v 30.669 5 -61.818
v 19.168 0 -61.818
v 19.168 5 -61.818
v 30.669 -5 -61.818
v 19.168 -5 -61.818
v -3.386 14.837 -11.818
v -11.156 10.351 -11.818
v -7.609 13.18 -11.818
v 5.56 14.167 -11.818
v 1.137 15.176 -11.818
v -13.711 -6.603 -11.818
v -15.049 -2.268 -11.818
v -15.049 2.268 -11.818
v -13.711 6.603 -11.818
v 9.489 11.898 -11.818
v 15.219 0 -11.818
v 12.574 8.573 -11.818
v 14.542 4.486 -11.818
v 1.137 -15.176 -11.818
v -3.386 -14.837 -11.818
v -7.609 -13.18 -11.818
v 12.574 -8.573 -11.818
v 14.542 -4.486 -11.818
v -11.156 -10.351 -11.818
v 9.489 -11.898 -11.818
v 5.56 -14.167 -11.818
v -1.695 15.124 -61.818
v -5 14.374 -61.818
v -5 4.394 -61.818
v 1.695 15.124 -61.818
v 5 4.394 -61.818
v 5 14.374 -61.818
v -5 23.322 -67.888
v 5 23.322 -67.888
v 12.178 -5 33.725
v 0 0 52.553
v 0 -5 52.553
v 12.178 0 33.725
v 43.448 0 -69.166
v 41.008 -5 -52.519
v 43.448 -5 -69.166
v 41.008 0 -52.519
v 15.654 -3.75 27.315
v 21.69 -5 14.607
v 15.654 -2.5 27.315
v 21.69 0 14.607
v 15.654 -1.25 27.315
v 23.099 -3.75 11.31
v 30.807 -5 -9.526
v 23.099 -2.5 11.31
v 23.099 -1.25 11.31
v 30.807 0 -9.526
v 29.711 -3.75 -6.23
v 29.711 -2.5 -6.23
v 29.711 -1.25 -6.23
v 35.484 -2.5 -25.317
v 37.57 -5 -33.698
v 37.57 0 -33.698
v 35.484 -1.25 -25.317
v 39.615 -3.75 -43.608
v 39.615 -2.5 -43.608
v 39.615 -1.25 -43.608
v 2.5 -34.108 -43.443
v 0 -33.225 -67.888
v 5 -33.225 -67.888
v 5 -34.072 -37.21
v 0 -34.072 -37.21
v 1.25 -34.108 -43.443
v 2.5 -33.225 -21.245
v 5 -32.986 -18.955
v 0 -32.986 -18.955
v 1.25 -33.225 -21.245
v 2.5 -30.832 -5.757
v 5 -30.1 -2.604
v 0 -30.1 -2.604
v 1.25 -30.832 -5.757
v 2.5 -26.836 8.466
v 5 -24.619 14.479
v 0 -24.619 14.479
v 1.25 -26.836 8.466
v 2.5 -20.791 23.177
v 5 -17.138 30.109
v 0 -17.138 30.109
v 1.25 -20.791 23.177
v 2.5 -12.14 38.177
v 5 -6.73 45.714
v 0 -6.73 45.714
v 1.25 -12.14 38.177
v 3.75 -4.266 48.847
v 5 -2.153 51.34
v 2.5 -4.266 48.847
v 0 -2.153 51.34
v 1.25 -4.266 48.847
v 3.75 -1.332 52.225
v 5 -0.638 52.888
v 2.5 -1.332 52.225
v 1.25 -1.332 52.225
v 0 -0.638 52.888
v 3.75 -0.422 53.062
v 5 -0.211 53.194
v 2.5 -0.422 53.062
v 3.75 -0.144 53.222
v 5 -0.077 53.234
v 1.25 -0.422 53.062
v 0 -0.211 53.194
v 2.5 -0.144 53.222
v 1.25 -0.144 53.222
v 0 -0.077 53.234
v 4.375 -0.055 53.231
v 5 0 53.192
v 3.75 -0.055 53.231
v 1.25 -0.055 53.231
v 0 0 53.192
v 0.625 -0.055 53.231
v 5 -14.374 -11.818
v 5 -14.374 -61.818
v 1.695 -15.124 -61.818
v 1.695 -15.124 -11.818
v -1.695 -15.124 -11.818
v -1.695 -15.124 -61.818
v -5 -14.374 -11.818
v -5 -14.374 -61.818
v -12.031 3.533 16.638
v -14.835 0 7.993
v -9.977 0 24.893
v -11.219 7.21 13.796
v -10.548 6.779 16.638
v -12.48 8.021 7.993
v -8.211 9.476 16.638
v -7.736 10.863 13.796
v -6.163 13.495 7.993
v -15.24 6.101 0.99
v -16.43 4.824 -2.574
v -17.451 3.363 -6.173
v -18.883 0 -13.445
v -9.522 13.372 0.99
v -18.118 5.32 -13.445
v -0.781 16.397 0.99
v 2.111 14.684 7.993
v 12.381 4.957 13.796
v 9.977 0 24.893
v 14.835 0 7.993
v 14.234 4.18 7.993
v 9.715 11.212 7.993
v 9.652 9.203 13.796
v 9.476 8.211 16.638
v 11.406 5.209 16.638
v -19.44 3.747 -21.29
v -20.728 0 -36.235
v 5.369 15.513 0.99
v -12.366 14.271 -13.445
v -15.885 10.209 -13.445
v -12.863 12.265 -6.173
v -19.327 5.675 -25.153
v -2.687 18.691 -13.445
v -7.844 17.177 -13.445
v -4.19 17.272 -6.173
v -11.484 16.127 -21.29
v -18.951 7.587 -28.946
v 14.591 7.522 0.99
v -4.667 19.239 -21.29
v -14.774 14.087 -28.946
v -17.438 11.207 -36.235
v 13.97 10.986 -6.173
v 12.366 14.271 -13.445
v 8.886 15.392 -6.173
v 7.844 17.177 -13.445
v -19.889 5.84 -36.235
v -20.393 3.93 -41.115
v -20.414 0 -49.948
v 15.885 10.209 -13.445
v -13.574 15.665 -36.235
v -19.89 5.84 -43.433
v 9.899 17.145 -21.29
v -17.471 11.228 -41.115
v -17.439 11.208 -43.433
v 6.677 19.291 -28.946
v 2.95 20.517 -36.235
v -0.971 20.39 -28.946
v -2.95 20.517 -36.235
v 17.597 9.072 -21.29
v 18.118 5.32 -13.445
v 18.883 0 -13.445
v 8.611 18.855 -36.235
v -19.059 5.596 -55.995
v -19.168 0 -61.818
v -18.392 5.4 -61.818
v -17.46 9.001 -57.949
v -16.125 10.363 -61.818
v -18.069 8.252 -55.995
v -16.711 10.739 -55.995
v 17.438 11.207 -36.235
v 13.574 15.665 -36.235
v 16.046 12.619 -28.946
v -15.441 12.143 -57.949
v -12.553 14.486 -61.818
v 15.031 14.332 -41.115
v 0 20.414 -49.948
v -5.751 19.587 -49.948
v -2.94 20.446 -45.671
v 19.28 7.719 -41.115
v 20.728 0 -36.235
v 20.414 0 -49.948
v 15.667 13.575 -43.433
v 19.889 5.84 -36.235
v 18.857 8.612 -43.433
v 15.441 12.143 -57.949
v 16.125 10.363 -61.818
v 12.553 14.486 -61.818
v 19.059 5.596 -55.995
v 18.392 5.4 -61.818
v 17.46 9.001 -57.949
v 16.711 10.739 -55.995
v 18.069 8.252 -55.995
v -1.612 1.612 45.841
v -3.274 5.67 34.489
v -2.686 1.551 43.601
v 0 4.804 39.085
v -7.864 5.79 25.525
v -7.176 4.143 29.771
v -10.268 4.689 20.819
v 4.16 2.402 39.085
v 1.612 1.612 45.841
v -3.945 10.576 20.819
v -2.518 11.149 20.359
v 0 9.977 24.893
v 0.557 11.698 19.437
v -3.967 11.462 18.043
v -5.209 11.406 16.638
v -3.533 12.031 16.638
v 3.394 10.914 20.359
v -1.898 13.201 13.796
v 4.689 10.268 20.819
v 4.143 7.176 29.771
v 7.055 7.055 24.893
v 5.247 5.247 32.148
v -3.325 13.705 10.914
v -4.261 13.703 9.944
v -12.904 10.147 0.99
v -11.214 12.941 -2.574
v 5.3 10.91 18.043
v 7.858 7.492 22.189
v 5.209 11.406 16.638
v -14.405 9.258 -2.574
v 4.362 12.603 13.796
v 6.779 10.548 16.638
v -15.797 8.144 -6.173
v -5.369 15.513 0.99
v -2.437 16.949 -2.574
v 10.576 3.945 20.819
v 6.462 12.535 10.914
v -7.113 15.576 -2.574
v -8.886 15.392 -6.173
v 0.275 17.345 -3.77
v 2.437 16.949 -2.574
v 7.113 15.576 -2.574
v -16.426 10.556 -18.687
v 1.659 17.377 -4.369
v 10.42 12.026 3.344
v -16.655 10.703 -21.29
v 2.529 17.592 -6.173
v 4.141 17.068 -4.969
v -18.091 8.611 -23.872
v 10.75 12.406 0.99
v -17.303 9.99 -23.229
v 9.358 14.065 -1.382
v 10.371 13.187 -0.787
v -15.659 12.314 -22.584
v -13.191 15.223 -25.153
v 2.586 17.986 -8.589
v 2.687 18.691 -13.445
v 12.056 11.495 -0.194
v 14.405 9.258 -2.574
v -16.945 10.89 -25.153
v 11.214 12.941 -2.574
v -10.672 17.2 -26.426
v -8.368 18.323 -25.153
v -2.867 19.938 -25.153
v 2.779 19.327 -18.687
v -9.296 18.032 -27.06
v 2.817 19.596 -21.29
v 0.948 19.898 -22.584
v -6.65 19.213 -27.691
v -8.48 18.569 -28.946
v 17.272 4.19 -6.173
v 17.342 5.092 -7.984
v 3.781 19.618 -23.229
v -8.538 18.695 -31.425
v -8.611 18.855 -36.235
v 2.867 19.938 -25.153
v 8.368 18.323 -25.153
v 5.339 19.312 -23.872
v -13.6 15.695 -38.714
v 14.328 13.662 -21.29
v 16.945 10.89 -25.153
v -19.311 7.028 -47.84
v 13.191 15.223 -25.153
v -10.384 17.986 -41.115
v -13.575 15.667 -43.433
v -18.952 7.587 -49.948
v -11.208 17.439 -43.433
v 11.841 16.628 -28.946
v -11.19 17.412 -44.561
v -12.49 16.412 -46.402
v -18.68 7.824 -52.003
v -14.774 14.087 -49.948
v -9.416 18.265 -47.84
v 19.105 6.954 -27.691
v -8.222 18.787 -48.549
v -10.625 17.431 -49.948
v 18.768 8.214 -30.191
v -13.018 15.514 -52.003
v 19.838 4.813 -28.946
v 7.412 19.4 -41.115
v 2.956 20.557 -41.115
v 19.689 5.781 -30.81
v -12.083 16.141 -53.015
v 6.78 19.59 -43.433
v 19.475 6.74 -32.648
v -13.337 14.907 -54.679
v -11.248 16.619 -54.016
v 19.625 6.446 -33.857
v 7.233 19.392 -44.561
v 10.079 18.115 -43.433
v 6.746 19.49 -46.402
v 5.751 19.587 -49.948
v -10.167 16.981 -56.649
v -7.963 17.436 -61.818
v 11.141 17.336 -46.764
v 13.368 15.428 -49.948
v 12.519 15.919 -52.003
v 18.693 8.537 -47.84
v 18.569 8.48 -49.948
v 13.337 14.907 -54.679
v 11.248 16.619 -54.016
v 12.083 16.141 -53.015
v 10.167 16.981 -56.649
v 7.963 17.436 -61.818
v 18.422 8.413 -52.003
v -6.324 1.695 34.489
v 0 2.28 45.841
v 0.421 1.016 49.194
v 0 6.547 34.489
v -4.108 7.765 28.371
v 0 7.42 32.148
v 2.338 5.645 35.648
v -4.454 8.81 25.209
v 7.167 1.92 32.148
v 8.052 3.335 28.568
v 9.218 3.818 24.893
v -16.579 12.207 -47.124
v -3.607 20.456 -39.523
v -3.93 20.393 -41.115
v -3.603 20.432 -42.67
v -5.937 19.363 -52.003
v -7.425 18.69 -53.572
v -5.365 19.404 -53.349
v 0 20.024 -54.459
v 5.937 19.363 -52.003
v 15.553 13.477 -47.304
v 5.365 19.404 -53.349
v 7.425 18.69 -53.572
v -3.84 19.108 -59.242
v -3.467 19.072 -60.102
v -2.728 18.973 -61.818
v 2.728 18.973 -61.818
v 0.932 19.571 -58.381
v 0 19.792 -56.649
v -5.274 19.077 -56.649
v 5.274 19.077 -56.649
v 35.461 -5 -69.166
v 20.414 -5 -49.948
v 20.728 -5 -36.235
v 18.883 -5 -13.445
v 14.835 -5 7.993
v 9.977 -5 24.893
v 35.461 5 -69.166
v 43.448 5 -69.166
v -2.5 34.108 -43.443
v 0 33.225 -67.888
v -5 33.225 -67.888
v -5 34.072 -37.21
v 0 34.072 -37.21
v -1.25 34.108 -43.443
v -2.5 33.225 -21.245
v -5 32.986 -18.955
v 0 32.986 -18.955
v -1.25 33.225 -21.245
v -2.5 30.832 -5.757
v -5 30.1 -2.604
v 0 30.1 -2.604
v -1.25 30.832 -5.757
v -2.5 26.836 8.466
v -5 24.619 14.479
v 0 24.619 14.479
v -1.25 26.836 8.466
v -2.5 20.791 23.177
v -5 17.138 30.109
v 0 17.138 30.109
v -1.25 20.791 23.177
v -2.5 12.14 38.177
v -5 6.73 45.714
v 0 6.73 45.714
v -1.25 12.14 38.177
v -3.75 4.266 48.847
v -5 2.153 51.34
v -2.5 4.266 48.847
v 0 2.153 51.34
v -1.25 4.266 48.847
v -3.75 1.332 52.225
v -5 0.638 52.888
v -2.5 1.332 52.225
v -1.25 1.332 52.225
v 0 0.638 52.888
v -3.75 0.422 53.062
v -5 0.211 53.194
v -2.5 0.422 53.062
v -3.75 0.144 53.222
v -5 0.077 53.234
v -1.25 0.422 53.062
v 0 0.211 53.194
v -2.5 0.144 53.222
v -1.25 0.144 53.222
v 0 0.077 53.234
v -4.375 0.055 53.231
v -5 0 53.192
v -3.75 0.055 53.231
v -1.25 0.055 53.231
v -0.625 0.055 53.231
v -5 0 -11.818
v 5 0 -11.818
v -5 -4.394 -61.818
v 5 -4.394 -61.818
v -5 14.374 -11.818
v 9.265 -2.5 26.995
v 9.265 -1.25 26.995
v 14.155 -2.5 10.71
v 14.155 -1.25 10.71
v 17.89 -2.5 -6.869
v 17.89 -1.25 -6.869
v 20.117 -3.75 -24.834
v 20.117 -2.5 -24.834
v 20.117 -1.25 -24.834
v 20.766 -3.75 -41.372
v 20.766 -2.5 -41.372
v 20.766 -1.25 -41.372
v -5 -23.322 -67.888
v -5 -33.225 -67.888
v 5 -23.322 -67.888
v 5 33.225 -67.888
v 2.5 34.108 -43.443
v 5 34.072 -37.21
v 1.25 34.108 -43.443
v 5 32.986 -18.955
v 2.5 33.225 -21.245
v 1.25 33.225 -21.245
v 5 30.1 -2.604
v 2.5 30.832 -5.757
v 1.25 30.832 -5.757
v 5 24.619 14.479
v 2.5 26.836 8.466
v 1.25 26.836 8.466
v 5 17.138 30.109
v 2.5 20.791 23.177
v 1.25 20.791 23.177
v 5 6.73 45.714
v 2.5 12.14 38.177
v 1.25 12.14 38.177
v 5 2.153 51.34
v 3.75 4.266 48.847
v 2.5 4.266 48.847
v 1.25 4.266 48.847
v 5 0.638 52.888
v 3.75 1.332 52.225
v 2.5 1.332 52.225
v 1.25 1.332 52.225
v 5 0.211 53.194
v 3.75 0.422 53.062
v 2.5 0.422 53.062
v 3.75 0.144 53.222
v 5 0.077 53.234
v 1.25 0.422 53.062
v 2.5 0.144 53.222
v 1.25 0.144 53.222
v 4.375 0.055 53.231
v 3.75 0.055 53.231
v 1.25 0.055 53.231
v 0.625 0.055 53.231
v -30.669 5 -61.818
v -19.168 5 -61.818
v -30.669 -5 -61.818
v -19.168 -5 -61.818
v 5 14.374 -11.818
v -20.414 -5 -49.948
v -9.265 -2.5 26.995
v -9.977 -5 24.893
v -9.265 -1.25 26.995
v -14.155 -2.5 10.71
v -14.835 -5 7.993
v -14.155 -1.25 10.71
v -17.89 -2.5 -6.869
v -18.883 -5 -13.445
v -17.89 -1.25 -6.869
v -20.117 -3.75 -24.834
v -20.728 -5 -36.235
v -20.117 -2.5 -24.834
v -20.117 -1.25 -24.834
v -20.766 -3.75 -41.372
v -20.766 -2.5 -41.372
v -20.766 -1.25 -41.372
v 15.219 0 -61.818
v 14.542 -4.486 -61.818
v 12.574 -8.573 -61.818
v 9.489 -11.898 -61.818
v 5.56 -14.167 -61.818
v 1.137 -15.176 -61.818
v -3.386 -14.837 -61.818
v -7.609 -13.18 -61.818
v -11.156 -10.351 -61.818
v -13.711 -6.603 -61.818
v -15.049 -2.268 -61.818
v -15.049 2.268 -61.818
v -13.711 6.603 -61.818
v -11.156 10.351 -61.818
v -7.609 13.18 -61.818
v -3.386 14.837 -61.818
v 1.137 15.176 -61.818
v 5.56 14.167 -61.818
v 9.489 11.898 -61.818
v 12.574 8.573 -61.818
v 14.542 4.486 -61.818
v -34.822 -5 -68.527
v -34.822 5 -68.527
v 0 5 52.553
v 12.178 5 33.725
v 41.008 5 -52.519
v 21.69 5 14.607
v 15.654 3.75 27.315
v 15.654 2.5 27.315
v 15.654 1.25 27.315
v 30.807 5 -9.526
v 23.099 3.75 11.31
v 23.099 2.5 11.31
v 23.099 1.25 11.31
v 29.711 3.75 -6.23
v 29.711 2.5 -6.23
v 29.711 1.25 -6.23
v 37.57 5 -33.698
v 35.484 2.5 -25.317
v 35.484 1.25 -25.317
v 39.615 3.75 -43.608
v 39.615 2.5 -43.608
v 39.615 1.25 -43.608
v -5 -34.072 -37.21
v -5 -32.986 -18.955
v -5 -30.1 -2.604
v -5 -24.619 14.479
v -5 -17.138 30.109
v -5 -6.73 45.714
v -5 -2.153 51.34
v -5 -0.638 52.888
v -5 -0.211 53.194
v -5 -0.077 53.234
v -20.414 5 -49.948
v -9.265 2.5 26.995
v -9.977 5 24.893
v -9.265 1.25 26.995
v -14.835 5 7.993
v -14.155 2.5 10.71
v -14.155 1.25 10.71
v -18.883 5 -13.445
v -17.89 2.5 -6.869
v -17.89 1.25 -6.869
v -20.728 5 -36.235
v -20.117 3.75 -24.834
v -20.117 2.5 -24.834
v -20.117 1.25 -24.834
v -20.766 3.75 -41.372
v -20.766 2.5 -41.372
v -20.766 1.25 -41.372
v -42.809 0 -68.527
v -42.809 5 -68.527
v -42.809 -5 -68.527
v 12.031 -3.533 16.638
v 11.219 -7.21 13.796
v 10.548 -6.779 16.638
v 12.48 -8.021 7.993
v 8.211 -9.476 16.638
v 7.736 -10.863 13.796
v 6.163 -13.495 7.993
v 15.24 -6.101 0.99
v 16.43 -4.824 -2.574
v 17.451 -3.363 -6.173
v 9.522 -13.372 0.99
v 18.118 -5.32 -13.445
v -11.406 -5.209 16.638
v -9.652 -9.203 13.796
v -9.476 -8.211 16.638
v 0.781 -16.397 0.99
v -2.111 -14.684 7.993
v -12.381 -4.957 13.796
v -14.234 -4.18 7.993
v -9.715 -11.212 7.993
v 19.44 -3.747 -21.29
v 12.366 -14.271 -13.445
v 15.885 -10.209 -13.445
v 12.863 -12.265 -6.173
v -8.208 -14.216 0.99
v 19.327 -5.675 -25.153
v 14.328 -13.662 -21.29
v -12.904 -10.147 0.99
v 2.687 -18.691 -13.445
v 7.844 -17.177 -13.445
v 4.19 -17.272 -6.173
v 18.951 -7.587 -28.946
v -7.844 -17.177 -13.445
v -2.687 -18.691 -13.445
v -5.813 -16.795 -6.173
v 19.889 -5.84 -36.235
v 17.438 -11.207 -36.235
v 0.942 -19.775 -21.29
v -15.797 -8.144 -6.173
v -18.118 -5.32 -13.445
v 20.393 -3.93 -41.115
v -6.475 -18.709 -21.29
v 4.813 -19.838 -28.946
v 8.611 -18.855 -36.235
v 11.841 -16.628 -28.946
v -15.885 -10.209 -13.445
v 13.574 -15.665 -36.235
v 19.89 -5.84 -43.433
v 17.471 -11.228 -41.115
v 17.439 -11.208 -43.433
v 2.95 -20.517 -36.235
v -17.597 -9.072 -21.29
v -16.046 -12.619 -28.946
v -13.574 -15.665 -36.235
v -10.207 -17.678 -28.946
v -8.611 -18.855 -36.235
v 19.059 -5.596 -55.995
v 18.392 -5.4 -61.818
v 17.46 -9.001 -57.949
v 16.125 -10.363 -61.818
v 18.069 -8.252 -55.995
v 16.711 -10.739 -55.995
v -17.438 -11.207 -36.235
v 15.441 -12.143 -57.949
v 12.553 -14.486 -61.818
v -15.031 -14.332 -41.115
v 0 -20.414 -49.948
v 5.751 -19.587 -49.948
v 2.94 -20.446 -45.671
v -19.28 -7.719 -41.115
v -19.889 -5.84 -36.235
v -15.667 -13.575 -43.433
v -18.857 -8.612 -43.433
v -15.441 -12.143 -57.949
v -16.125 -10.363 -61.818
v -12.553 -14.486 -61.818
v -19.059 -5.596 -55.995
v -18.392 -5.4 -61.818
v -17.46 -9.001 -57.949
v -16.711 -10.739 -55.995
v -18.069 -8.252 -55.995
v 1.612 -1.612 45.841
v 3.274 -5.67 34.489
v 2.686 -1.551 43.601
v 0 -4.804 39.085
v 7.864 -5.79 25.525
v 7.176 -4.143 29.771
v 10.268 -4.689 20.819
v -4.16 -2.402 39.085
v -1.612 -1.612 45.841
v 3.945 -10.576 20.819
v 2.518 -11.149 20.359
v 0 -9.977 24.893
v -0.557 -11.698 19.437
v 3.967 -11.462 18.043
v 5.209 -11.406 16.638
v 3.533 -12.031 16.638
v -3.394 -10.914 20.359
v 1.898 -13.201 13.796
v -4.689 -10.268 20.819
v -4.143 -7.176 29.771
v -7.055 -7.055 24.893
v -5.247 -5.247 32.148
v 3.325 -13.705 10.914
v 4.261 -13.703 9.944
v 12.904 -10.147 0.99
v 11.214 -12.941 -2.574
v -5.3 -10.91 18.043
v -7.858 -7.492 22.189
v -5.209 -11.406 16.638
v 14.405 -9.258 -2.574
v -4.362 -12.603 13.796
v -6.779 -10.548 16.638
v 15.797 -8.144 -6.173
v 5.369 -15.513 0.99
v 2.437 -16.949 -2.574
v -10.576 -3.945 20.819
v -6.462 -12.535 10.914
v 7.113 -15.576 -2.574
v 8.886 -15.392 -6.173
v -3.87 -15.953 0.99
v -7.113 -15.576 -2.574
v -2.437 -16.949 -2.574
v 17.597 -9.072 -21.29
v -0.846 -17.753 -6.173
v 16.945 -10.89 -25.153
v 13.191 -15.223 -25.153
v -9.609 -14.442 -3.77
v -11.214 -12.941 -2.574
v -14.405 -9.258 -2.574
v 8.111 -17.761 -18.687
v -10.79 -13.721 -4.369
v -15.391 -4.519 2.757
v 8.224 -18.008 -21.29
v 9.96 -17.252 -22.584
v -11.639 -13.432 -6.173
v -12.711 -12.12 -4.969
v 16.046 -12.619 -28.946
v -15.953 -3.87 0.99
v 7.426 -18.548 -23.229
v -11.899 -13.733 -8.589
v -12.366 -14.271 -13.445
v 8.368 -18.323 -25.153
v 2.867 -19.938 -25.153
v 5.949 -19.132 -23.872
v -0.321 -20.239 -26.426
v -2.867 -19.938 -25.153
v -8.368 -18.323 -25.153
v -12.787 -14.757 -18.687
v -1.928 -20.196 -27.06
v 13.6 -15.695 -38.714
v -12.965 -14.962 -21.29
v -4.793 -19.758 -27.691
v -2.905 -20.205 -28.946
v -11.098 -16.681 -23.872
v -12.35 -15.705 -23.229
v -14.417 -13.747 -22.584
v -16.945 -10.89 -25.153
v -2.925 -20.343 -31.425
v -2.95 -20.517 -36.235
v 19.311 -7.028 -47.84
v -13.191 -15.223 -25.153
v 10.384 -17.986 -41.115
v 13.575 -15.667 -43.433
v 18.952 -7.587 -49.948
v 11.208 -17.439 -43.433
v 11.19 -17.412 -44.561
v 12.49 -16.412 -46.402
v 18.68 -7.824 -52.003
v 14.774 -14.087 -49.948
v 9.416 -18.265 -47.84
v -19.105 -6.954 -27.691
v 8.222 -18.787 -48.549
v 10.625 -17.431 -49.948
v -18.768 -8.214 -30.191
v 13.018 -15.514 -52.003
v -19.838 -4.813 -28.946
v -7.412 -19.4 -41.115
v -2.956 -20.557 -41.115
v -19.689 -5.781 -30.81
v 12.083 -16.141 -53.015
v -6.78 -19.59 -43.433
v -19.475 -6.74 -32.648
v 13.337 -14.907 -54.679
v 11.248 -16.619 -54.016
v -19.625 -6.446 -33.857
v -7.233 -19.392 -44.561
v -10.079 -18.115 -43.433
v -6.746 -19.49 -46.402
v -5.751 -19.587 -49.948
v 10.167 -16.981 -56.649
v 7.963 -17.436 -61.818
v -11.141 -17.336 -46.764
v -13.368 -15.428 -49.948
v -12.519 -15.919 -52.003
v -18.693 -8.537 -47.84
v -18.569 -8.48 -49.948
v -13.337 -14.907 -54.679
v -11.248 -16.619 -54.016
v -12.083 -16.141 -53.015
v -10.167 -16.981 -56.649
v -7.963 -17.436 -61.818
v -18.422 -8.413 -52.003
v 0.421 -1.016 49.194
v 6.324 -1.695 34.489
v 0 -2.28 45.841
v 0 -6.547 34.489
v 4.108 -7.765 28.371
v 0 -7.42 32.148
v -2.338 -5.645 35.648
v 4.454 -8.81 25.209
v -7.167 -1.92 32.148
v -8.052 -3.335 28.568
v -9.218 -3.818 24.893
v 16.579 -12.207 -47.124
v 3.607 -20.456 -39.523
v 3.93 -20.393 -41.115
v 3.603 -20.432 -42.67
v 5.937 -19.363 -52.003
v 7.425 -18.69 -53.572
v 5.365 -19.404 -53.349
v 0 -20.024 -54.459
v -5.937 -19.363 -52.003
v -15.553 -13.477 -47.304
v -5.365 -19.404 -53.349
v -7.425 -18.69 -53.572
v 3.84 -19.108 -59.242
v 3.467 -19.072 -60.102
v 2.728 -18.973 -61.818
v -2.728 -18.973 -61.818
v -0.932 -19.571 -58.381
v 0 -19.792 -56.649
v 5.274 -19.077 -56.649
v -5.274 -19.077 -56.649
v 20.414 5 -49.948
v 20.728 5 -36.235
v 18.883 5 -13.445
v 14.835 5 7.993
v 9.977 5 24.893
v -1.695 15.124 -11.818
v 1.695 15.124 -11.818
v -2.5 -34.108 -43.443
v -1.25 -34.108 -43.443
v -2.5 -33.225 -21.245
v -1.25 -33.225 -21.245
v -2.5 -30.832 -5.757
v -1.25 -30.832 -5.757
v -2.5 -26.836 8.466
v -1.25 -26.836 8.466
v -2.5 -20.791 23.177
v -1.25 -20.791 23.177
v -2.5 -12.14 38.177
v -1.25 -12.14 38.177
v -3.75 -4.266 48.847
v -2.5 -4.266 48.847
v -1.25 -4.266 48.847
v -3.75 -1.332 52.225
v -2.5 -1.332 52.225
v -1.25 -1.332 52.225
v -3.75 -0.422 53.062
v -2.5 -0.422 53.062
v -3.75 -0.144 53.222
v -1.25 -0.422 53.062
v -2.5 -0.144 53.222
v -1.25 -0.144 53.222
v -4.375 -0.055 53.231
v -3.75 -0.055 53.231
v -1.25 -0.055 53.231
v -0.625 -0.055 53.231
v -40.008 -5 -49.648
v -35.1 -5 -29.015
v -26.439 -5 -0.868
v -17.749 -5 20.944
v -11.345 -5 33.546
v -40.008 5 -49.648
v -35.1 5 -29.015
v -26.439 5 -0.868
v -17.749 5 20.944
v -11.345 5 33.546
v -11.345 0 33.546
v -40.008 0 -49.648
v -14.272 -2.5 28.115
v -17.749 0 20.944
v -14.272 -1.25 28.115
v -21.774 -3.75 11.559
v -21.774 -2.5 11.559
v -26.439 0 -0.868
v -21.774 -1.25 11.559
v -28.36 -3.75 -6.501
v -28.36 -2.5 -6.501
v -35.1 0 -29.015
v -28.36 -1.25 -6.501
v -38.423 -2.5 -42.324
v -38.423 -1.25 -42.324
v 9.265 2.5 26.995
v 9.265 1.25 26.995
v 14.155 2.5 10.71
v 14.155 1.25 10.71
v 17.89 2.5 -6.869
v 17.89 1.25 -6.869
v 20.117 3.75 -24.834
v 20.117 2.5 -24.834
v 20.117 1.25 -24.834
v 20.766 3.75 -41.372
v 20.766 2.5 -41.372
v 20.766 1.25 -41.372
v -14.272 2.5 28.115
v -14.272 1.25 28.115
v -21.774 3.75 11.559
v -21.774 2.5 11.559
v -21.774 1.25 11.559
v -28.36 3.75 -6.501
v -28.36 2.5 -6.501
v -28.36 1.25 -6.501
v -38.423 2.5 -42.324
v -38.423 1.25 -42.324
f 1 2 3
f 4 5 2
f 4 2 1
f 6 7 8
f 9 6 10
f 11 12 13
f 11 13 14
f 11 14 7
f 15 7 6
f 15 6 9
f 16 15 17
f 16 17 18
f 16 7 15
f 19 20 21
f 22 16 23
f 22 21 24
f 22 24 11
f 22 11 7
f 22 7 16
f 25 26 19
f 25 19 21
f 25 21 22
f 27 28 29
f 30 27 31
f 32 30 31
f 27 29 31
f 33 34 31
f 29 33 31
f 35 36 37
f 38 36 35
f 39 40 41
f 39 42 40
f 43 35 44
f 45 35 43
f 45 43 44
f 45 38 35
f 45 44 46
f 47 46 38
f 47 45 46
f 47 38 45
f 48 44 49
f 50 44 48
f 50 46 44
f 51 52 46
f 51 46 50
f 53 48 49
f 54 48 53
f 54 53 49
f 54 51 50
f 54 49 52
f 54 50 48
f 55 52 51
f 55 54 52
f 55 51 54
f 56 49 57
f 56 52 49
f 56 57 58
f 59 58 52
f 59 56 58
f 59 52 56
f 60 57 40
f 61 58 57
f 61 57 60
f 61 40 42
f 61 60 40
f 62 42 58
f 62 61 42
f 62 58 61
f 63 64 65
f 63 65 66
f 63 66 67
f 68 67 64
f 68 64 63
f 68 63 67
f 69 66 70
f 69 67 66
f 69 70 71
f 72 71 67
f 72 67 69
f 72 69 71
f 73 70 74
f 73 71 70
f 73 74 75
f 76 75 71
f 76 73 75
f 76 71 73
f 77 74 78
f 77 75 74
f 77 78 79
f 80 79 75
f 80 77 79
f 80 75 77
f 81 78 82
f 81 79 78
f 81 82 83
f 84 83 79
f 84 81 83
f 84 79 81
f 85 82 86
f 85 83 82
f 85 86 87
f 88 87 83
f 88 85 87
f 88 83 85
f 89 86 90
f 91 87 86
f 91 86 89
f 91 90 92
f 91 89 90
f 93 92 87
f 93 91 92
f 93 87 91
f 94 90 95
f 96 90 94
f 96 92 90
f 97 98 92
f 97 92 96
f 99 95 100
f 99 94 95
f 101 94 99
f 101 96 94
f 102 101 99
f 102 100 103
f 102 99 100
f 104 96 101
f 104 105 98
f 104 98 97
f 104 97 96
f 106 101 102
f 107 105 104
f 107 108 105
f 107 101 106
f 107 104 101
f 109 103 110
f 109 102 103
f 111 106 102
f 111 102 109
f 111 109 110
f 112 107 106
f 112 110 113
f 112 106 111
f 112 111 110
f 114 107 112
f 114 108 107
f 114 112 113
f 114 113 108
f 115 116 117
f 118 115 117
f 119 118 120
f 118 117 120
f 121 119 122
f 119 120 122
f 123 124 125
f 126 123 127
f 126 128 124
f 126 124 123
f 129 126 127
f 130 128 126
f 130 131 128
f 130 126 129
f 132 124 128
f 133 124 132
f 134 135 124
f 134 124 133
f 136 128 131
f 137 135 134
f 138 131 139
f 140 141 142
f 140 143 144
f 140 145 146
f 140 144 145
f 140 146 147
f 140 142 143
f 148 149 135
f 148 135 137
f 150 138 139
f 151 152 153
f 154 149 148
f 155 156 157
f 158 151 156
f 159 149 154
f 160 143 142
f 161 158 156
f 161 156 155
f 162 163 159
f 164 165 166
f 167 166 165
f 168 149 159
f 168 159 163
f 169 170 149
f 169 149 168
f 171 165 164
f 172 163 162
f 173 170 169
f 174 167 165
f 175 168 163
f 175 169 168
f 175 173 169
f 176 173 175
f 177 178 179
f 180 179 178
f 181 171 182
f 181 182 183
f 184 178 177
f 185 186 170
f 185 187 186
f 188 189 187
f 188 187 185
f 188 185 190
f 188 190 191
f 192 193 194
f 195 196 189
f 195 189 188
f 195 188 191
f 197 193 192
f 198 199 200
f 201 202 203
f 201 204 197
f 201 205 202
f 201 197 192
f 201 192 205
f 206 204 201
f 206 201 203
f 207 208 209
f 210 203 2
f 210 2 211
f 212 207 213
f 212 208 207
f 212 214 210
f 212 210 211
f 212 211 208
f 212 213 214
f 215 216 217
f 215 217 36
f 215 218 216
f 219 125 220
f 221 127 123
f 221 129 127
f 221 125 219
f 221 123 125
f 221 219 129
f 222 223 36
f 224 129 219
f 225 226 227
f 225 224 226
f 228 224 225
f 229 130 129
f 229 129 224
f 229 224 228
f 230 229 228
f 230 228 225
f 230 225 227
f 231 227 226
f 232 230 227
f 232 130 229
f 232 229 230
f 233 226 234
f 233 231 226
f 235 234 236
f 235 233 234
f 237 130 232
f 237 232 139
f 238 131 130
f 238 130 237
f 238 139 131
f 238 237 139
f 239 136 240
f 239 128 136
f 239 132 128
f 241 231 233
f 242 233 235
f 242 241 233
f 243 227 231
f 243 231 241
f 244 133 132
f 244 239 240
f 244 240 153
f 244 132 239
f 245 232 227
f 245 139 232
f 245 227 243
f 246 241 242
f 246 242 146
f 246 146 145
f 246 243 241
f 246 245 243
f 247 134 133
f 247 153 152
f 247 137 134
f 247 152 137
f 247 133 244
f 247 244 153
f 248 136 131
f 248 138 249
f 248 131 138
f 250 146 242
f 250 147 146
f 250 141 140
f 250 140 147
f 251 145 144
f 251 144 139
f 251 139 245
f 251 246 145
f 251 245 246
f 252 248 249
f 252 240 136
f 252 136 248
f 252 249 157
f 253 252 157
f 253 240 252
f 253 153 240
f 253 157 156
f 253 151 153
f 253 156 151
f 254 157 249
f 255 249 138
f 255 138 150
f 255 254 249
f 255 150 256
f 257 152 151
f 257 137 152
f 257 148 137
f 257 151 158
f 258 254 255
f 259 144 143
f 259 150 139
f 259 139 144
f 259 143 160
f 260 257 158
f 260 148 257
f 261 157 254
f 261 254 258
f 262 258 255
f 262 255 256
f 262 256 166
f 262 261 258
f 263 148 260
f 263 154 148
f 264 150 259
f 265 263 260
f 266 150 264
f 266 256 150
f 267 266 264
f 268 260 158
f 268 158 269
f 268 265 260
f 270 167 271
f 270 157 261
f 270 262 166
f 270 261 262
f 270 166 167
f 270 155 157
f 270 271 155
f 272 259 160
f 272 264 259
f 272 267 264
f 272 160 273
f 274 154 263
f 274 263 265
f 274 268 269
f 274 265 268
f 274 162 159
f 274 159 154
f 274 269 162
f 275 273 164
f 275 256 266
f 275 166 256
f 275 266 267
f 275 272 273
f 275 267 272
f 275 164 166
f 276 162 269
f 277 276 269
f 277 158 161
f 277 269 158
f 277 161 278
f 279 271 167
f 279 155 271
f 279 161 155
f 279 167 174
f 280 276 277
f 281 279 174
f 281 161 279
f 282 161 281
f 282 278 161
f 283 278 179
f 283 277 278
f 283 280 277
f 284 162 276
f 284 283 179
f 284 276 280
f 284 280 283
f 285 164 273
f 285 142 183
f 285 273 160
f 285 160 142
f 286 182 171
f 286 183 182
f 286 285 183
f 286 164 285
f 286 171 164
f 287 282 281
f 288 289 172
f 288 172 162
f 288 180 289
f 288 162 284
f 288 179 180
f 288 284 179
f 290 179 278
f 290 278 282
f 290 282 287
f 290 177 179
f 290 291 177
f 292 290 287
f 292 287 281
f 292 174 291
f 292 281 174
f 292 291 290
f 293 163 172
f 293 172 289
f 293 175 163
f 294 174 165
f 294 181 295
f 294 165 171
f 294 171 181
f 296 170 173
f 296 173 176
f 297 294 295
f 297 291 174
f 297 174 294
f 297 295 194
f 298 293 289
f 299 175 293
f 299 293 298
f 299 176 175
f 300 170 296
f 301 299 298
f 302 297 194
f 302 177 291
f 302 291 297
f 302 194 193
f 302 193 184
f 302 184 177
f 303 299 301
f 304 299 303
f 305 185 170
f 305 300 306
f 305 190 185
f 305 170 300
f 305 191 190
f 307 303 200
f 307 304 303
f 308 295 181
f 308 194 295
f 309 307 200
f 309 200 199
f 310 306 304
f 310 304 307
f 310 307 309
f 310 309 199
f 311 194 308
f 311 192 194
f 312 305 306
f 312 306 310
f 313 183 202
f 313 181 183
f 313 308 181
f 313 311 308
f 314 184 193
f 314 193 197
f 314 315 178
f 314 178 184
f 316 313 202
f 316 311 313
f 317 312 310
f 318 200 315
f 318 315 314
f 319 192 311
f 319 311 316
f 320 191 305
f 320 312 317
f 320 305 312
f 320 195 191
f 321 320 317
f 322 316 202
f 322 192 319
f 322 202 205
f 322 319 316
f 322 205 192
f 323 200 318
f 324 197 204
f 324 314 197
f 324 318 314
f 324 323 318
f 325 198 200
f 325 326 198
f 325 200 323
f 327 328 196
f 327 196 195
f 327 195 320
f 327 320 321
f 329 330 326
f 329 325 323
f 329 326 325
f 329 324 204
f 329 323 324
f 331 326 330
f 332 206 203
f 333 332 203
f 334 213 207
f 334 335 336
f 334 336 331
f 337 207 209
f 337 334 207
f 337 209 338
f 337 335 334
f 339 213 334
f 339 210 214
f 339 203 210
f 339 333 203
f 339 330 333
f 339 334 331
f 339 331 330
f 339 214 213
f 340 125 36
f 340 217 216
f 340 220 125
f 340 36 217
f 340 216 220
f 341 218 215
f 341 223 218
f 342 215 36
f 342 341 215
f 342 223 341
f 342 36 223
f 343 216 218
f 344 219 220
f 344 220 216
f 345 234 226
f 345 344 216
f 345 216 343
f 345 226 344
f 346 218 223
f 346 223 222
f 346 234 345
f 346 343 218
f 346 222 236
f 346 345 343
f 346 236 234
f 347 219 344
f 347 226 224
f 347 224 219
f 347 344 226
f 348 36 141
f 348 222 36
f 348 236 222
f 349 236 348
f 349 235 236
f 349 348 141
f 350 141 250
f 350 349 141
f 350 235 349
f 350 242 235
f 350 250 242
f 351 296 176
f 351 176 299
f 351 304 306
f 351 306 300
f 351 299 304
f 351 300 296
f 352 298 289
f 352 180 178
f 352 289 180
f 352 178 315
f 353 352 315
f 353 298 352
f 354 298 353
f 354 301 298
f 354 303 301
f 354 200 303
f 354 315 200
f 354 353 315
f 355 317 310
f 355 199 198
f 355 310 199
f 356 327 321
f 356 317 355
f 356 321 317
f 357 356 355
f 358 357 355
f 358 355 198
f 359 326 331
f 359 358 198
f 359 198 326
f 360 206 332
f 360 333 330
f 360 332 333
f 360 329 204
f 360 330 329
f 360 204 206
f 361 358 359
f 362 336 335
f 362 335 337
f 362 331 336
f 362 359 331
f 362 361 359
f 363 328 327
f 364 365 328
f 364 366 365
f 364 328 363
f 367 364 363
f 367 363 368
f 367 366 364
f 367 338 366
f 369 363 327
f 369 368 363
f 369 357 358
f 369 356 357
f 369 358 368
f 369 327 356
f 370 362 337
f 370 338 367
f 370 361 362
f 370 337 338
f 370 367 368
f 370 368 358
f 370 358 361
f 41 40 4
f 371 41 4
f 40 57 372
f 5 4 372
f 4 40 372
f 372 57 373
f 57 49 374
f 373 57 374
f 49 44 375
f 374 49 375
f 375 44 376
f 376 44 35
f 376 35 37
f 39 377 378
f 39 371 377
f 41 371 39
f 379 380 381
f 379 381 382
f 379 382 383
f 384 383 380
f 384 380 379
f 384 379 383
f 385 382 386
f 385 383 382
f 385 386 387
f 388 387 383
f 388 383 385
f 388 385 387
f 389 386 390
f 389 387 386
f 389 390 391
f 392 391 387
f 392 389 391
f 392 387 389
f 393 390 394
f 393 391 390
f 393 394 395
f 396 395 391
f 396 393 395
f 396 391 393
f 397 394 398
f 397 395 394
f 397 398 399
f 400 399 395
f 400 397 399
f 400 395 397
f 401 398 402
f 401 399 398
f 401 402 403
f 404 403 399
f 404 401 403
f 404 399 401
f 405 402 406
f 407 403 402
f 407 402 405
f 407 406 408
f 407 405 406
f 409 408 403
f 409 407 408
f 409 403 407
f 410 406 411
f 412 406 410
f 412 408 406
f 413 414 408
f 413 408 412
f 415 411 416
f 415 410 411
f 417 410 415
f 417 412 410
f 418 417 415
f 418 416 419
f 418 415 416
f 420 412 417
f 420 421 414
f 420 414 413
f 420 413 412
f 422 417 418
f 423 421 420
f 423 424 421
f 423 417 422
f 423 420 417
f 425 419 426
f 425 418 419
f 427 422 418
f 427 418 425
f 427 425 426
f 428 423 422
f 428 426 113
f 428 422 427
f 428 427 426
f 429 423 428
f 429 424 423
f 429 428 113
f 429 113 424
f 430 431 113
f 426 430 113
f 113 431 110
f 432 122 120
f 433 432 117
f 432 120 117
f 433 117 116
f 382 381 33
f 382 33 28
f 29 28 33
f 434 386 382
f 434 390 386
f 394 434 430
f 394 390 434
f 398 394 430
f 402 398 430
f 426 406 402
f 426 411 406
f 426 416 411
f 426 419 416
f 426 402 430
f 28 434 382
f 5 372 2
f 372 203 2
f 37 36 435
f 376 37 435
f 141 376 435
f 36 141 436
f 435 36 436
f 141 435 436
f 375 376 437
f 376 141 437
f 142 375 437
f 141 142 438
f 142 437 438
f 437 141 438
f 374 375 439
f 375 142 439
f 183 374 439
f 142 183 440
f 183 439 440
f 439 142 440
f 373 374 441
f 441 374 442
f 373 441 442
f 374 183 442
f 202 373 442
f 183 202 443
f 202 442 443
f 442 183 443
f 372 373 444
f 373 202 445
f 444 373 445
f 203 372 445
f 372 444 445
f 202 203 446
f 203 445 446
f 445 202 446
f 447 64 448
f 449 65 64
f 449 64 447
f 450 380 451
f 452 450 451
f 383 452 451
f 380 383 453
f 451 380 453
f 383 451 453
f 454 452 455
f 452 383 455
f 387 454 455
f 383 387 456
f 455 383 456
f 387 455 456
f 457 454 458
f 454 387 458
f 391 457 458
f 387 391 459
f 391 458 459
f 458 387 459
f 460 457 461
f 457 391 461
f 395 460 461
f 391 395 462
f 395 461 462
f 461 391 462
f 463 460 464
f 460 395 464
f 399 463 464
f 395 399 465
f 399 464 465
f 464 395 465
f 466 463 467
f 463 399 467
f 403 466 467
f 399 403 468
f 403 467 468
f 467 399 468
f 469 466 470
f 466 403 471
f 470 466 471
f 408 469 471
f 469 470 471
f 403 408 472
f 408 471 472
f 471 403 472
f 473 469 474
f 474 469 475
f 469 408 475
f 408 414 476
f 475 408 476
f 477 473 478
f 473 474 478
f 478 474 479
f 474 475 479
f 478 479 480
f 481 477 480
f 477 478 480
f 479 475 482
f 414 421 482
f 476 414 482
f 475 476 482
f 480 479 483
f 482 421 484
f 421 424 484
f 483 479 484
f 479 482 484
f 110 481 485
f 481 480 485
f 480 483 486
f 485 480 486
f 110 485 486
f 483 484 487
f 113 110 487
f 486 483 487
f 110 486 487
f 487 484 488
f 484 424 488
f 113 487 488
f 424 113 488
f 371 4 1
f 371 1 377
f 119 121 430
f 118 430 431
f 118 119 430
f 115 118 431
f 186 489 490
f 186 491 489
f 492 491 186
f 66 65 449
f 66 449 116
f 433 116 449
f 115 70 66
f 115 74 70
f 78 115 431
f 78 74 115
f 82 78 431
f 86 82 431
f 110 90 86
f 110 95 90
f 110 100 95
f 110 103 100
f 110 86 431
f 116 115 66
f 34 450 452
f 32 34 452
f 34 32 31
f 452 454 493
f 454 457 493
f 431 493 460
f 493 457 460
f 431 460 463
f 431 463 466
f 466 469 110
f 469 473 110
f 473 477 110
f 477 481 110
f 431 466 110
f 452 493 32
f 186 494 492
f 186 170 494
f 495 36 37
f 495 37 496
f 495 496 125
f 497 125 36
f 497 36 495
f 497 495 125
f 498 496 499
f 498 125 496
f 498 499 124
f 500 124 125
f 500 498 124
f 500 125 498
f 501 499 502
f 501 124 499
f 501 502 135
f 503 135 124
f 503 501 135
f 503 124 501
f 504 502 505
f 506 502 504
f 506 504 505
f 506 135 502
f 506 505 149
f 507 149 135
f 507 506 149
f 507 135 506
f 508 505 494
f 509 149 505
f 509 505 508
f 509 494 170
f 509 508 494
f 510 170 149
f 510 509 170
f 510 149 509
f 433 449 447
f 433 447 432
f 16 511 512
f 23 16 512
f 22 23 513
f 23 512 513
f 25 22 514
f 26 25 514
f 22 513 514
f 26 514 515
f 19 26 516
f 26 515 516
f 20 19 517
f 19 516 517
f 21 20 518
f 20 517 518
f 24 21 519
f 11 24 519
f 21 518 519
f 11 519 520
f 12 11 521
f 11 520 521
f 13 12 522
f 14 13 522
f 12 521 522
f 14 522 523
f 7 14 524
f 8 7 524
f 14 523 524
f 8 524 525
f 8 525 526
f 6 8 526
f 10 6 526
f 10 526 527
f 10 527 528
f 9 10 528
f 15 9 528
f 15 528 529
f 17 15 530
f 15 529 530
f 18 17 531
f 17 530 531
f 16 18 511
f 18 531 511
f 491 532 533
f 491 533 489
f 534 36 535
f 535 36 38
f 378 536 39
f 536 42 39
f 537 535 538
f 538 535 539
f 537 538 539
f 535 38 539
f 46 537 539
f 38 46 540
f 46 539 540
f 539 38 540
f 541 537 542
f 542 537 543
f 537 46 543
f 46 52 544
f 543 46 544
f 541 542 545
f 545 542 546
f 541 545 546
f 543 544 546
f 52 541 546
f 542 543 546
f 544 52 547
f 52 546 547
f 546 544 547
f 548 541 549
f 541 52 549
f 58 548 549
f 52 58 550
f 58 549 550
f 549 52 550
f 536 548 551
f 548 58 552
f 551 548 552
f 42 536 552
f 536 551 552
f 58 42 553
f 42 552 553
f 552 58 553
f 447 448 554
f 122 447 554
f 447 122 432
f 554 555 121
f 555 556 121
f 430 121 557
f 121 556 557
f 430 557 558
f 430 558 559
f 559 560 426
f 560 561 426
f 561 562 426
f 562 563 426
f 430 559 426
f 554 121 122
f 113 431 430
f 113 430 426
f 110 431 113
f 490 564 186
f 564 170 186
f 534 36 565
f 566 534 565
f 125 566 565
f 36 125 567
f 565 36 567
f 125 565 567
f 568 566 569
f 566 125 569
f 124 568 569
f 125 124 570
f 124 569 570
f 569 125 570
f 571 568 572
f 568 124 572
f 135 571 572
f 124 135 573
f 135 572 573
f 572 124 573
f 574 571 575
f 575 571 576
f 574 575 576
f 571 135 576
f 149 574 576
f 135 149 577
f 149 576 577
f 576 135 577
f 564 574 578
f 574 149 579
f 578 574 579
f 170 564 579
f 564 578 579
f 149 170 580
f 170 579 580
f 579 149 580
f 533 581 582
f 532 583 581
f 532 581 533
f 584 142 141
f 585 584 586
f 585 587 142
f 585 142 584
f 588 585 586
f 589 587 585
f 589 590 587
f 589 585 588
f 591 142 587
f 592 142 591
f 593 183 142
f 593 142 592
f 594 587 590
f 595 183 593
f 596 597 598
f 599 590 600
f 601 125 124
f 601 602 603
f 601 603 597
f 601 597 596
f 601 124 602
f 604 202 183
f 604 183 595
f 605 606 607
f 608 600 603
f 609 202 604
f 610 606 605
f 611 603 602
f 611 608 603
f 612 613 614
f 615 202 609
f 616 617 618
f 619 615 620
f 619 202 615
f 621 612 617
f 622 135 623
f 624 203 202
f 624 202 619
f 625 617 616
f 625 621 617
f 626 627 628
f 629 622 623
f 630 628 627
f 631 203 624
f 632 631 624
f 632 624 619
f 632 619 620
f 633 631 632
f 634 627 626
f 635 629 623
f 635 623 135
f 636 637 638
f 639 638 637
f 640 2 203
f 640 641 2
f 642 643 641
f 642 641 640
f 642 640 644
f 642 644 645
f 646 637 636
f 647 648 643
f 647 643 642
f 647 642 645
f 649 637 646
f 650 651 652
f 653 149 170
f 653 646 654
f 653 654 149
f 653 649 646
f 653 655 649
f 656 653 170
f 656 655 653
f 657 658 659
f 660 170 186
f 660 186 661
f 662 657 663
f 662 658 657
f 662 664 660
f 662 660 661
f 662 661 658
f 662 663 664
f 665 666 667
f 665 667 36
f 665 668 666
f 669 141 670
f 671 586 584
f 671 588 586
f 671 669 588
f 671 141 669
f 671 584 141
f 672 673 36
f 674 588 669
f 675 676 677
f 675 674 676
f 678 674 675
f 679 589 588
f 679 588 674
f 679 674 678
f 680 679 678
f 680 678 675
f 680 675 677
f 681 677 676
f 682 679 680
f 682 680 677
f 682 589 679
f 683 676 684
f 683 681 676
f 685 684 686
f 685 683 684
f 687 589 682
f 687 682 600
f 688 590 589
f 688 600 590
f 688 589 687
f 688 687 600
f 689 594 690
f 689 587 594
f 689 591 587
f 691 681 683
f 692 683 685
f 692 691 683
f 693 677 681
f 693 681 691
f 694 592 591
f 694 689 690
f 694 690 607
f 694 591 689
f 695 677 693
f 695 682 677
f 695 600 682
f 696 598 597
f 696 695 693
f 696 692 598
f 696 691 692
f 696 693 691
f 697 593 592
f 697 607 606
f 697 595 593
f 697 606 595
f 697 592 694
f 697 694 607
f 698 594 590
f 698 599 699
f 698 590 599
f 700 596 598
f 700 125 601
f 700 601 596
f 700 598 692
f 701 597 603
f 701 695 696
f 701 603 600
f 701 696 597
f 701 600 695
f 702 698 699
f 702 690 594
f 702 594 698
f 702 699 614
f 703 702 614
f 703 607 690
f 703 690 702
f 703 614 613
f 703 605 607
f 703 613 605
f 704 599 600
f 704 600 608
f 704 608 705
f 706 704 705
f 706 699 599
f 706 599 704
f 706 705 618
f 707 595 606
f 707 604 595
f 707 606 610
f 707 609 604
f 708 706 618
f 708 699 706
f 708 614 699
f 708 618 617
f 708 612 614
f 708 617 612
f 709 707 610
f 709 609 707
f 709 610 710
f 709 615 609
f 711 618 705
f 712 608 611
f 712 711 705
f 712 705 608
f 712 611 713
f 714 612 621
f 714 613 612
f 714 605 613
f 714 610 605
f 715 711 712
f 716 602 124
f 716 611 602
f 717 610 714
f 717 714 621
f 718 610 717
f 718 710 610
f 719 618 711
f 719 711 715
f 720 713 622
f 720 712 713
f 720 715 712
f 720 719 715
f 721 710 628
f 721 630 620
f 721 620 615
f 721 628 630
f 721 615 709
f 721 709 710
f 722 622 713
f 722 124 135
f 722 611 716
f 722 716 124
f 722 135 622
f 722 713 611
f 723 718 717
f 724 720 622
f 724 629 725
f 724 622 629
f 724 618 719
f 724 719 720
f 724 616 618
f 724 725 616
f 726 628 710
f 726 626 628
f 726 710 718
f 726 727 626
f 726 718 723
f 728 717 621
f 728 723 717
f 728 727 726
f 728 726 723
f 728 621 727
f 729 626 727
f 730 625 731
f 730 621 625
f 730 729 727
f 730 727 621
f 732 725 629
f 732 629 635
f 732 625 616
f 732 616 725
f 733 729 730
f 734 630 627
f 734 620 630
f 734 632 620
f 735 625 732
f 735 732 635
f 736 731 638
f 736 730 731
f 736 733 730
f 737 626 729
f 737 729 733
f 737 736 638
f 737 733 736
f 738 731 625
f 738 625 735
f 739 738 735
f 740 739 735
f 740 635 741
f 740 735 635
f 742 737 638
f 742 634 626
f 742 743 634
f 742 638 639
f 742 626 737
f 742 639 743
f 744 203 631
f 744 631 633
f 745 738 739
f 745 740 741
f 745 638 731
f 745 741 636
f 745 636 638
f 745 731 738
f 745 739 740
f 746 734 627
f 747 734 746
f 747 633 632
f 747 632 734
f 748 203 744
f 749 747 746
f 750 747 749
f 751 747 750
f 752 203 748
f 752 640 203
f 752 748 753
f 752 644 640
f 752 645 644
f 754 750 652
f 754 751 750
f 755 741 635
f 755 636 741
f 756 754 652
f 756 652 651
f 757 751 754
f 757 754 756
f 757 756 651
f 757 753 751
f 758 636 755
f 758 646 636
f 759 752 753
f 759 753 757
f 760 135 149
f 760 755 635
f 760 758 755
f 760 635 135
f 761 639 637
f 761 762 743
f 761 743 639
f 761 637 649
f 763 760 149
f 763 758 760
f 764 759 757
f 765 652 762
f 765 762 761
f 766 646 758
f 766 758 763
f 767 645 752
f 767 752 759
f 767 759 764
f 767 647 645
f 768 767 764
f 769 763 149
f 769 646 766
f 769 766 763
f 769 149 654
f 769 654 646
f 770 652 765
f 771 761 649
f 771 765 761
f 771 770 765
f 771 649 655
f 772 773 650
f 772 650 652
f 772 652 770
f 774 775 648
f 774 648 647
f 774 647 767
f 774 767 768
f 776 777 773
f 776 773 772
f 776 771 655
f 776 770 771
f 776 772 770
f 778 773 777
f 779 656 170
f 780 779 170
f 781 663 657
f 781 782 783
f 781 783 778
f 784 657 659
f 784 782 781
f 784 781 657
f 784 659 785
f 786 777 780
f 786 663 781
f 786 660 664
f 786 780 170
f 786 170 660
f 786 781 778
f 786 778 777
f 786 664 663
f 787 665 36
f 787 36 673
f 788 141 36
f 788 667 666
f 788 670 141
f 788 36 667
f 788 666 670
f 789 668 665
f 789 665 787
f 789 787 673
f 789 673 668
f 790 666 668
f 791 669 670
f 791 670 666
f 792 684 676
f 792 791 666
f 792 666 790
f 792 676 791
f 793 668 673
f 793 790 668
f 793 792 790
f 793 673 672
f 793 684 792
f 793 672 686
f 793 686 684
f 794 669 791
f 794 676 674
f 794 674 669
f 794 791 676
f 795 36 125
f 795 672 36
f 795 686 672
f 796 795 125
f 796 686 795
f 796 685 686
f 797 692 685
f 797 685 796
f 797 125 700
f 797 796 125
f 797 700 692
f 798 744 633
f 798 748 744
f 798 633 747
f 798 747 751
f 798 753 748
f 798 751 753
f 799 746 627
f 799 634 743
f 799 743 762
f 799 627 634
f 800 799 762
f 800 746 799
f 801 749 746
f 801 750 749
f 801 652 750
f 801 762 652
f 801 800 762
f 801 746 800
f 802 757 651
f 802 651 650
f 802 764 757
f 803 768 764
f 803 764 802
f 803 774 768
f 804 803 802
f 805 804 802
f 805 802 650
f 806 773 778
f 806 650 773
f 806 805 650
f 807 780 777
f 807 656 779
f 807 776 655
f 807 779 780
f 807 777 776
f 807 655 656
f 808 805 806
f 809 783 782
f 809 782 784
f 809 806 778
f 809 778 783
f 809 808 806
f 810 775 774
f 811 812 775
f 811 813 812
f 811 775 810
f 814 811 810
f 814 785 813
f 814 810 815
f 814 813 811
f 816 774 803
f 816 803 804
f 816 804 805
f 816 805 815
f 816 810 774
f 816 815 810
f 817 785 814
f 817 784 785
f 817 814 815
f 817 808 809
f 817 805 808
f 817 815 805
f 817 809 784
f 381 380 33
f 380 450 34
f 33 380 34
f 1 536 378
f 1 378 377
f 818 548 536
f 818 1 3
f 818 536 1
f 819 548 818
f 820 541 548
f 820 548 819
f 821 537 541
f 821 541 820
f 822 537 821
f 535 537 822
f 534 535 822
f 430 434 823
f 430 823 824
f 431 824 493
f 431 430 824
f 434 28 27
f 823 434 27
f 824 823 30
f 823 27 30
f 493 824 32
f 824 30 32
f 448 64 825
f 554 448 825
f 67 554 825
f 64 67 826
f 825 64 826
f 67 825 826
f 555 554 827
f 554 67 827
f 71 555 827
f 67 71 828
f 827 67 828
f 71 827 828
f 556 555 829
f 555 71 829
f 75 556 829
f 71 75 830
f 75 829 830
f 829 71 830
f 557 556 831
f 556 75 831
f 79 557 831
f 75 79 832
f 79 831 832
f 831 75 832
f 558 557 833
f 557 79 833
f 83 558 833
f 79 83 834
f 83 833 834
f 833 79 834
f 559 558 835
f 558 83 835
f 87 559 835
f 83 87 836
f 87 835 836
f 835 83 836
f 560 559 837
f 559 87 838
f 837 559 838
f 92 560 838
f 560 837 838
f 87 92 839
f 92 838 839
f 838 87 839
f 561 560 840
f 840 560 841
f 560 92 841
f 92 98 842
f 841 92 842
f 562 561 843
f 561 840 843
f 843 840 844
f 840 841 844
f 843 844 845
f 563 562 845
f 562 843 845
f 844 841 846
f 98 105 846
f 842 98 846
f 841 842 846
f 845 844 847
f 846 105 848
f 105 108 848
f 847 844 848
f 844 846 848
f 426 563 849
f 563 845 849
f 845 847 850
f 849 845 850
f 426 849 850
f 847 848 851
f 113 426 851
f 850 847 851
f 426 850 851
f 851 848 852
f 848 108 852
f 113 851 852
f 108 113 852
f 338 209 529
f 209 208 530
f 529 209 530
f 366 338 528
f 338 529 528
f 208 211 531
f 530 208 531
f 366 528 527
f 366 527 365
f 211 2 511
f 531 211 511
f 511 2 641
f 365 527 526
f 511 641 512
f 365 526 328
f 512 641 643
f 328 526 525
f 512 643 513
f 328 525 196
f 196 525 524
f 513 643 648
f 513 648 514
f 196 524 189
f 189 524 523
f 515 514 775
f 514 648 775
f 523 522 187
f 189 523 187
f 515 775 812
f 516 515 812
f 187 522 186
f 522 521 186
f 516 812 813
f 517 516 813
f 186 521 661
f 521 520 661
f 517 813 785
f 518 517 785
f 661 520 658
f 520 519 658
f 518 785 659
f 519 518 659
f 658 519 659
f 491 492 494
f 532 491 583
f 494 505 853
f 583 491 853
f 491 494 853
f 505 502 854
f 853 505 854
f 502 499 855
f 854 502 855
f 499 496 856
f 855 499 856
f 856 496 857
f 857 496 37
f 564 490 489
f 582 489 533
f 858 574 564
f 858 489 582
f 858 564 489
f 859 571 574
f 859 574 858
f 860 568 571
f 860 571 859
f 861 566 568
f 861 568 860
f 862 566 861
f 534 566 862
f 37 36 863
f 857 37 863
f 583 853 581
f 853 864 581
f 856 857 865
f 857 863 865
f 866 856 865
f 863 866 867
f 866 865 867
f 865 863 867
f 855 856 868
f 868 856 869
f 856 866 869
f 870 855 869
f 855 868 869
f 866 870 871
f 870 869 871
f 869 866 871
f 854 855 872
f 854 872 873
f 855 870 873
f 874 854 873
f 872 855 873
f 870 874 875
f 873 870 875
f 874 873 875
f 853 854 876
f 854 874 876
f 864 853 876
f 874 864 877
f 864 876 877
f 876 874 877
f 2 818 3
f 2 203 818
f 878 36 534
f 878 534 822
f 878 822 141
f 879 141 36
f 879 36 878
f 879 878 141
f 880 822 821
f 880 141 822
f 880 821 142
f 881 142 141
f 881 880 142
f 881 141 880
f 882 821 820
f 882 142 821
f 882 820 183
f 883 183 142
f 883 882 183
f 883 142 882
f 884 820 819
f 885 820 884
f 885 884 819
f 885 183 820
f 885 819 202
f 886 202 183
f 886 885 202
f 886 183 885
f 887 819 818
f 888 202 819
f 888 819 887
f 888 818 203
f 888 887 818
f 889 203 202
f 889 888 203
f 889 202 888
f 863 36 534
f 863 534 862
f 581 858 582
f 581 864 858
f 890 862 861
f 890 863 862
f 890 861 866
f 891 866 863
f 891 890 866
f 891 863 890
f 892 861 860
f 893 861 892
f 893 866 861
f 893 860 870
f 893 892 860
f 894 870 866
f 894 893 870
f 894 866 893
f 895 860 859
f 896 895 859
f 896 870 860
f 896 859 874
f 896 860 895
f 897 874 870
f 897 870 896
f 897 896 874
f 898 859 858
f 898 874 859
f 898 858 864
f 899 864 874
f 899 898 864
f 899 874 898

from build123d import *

# Parameters (mm, degrees)
F2_DEPTH = 5
F4_DEPTH = 5
F6_R     = 15.218603284
F7_DEPTH = 50


with BuildPart() as f1:
    # F0 (on Front) → F1 (revolve)
    with BuildSketch(Plane.XZ):
        with BuildLine():
            add(Edge.make_bspline(
                [(0, 52.5532476604), (2.6107242902, 44.2114355184), (10.1209167037, 26.8656779462), (18.9207252723, -6.3209934437), (21.6111461209, -40.8941300023), (19.9801372454, -55.4528275347), (19.1683582962, -61.8179515004)],
                knots=[0, 0, 0, 0, 0.2420795839, 0.5165444069, 0.7897388021, 1, 1, 1, 1], degree=3))
            Line((0, 52.5532476604), (0, -61.8179515004))
            Line((0, -61.8179515004), (19.1683582962, -61.8179515004))
        make_face()
    revolve(axis=Axis((0, 0, -4.63235192), (0, 0, -1)))

    # F0 (on Front) → F2 (join, symmetric)
    with BuildSketch(Plane.XZ):
        with BuildLine():
            add(Edge.make_bspline(
                [(0, 52.5532476604), (5.7937135427, 44.5675662384), (16.6186930467, 27.4392118639), (30.4569483883, -5.7491705086), (40.5102909017, -43.1093197012), (41.9327566079, -61.0383403232), (43.4482768178, -69.1658258438)],
                knots=[0, 0, 0, 0, 0.2392039747, 0.5039164767, 0.7768609064, 1, 1, 1, 1], degree=3))
            add(Edge.make_bspline(
                [(0, 52.5532476604), (2.6107242902, 44.2114355184), (10.1209167037, 26.8656779462), (18.9207252723, -6.3209934437), (21.6111461209, -40.8941300023), (19.9801372454, -55.4528275347), (19.1683582962, -61.8179515004)],
                knots=[0, 0, 0, 0, 0.2420795839, 0.5165444069, 0.7897388021, 1, 1, 1, 1], degree=3))
            Line((19.1683582962, -61.8179515004), (30.6693688035, -61.8179515004))
            Line((30.6693688035, -61.8179515004), (35.4614630342, -69.1658258438))
            Line((35.4614630342, -69.1658258438), (43.4482768178, -69.1658258438))
        make_face()
        with BuildLine():
            add(Edge.make_bspline(
                [(0, 52.5532476604), (-2.6107242902, 44.2114355184), (-10.1209167037, 26.8656779462), (-18.9207252723, -6.3209934437), (-21.6111461209, -40.8941300023), (-19.9801372454, -55.4528275347), (-19.1683582962, -61.8179515004)],
                knots=[0, 0, 0, 0, 0.2420795839, 0.5165444069, 0.7897388021, 1, 1, 1, 1], degree=3))
            add(Edge.make_bspline(
                [(0, 52.5532476604), (-4.5758516976, 44.7584759148), (-15.4915101462, 28.2578589936), (-28.9613045774, -6.1706203584), (-38.833986536, -42.0005328373), (-42.0025167129, -59.6801020328), (-42.8091473398, -68.526878953)],
                knots=[0, 0, 0, 0, 0.2344836404, 0.5039418594, 0.772812103, 1, 1, 1, 1], degree=3))
            Line((-42.8091473398, -68.526878953), (-34.8221473398, -68.526878953))
            Line((-34.8221473398, -68.526878953), (-30.669, -61.8179515004))
            Line((-30.669, -61.8179515004), (-19.1683582962, -61.8179515004))
        make_face()
    extrude(amount=F2_DEPTH, both=True)


with BuildPart() as f4:
    # F3 (on Right) → F4 (new body, symmetric)
    with BuildSketch(Plane.YZ):
        with BuildLine():
            Line((-33.2251526415, -67.8879320621), (-23.3215019107, -67.8879320621))
            Line((-23.3215019107, -67.8879320621), (0, -60.4088529944))
            Line((0, -60.4088529944), (0, 52.8727211058))
            Line((0, 52.8727211058), (0, 53.1921945512))
            add(Edge.make_bspline(
                [(-33.2251526415, -67.8879320621), (-34.256642447, -51.2189023983), (-34.7821792002, -21.7594952268), (-27.8271289781, 8.8527738849), (-15.502732931, 35.5024516937), (-0.395167417, 53.8783305862), (0, 53.1921945512)],
                knots=[0, 0, 0, 0, 0.2961775361, 0.5352479572, 0.7849253433, 0.9754881409, 0.9754881409, 0.9754881409, 0.9754881409], degree=3))
        make_face()
    extrude(amount=F4_DEPTH, both=True)


with BuildPart() as f5_1:
    # F5: instance of F4
    add(f4.part.mirror(Plane.XZ))


with BuildPart() as f7_tool:
    # F6 (on face) → F7 (new body)
    with BuildSketch(Plane(origin=(0, 0, -61.8179515004), x_dir=(1, 0, 0), z_dir=(0, 0, -1))):
        Circle(F6_R)
    extrude(amount=-F7_DEPTH)


with BuildPart() as f1_1:
    add(f1.part)

    # F7: cut by f7_tool
    add(f7_tool.part, mode=Mode.SUBTRACT)


with BuildPart() as f4_1:
    add(f4.part)

    # F7: cut by f7_tool
    add(f7_tool.part, mode=Mode.SUBTRACT)


with BuildPart() as f5_1_1:
    add(f5_1.part)

    # F7: cut by f7_tool
    add(f7_tool.part, mode=Mode.SUBTRACT)


solid = Compound([f1_1.part, f4_1.part, f5_1_1.part])
